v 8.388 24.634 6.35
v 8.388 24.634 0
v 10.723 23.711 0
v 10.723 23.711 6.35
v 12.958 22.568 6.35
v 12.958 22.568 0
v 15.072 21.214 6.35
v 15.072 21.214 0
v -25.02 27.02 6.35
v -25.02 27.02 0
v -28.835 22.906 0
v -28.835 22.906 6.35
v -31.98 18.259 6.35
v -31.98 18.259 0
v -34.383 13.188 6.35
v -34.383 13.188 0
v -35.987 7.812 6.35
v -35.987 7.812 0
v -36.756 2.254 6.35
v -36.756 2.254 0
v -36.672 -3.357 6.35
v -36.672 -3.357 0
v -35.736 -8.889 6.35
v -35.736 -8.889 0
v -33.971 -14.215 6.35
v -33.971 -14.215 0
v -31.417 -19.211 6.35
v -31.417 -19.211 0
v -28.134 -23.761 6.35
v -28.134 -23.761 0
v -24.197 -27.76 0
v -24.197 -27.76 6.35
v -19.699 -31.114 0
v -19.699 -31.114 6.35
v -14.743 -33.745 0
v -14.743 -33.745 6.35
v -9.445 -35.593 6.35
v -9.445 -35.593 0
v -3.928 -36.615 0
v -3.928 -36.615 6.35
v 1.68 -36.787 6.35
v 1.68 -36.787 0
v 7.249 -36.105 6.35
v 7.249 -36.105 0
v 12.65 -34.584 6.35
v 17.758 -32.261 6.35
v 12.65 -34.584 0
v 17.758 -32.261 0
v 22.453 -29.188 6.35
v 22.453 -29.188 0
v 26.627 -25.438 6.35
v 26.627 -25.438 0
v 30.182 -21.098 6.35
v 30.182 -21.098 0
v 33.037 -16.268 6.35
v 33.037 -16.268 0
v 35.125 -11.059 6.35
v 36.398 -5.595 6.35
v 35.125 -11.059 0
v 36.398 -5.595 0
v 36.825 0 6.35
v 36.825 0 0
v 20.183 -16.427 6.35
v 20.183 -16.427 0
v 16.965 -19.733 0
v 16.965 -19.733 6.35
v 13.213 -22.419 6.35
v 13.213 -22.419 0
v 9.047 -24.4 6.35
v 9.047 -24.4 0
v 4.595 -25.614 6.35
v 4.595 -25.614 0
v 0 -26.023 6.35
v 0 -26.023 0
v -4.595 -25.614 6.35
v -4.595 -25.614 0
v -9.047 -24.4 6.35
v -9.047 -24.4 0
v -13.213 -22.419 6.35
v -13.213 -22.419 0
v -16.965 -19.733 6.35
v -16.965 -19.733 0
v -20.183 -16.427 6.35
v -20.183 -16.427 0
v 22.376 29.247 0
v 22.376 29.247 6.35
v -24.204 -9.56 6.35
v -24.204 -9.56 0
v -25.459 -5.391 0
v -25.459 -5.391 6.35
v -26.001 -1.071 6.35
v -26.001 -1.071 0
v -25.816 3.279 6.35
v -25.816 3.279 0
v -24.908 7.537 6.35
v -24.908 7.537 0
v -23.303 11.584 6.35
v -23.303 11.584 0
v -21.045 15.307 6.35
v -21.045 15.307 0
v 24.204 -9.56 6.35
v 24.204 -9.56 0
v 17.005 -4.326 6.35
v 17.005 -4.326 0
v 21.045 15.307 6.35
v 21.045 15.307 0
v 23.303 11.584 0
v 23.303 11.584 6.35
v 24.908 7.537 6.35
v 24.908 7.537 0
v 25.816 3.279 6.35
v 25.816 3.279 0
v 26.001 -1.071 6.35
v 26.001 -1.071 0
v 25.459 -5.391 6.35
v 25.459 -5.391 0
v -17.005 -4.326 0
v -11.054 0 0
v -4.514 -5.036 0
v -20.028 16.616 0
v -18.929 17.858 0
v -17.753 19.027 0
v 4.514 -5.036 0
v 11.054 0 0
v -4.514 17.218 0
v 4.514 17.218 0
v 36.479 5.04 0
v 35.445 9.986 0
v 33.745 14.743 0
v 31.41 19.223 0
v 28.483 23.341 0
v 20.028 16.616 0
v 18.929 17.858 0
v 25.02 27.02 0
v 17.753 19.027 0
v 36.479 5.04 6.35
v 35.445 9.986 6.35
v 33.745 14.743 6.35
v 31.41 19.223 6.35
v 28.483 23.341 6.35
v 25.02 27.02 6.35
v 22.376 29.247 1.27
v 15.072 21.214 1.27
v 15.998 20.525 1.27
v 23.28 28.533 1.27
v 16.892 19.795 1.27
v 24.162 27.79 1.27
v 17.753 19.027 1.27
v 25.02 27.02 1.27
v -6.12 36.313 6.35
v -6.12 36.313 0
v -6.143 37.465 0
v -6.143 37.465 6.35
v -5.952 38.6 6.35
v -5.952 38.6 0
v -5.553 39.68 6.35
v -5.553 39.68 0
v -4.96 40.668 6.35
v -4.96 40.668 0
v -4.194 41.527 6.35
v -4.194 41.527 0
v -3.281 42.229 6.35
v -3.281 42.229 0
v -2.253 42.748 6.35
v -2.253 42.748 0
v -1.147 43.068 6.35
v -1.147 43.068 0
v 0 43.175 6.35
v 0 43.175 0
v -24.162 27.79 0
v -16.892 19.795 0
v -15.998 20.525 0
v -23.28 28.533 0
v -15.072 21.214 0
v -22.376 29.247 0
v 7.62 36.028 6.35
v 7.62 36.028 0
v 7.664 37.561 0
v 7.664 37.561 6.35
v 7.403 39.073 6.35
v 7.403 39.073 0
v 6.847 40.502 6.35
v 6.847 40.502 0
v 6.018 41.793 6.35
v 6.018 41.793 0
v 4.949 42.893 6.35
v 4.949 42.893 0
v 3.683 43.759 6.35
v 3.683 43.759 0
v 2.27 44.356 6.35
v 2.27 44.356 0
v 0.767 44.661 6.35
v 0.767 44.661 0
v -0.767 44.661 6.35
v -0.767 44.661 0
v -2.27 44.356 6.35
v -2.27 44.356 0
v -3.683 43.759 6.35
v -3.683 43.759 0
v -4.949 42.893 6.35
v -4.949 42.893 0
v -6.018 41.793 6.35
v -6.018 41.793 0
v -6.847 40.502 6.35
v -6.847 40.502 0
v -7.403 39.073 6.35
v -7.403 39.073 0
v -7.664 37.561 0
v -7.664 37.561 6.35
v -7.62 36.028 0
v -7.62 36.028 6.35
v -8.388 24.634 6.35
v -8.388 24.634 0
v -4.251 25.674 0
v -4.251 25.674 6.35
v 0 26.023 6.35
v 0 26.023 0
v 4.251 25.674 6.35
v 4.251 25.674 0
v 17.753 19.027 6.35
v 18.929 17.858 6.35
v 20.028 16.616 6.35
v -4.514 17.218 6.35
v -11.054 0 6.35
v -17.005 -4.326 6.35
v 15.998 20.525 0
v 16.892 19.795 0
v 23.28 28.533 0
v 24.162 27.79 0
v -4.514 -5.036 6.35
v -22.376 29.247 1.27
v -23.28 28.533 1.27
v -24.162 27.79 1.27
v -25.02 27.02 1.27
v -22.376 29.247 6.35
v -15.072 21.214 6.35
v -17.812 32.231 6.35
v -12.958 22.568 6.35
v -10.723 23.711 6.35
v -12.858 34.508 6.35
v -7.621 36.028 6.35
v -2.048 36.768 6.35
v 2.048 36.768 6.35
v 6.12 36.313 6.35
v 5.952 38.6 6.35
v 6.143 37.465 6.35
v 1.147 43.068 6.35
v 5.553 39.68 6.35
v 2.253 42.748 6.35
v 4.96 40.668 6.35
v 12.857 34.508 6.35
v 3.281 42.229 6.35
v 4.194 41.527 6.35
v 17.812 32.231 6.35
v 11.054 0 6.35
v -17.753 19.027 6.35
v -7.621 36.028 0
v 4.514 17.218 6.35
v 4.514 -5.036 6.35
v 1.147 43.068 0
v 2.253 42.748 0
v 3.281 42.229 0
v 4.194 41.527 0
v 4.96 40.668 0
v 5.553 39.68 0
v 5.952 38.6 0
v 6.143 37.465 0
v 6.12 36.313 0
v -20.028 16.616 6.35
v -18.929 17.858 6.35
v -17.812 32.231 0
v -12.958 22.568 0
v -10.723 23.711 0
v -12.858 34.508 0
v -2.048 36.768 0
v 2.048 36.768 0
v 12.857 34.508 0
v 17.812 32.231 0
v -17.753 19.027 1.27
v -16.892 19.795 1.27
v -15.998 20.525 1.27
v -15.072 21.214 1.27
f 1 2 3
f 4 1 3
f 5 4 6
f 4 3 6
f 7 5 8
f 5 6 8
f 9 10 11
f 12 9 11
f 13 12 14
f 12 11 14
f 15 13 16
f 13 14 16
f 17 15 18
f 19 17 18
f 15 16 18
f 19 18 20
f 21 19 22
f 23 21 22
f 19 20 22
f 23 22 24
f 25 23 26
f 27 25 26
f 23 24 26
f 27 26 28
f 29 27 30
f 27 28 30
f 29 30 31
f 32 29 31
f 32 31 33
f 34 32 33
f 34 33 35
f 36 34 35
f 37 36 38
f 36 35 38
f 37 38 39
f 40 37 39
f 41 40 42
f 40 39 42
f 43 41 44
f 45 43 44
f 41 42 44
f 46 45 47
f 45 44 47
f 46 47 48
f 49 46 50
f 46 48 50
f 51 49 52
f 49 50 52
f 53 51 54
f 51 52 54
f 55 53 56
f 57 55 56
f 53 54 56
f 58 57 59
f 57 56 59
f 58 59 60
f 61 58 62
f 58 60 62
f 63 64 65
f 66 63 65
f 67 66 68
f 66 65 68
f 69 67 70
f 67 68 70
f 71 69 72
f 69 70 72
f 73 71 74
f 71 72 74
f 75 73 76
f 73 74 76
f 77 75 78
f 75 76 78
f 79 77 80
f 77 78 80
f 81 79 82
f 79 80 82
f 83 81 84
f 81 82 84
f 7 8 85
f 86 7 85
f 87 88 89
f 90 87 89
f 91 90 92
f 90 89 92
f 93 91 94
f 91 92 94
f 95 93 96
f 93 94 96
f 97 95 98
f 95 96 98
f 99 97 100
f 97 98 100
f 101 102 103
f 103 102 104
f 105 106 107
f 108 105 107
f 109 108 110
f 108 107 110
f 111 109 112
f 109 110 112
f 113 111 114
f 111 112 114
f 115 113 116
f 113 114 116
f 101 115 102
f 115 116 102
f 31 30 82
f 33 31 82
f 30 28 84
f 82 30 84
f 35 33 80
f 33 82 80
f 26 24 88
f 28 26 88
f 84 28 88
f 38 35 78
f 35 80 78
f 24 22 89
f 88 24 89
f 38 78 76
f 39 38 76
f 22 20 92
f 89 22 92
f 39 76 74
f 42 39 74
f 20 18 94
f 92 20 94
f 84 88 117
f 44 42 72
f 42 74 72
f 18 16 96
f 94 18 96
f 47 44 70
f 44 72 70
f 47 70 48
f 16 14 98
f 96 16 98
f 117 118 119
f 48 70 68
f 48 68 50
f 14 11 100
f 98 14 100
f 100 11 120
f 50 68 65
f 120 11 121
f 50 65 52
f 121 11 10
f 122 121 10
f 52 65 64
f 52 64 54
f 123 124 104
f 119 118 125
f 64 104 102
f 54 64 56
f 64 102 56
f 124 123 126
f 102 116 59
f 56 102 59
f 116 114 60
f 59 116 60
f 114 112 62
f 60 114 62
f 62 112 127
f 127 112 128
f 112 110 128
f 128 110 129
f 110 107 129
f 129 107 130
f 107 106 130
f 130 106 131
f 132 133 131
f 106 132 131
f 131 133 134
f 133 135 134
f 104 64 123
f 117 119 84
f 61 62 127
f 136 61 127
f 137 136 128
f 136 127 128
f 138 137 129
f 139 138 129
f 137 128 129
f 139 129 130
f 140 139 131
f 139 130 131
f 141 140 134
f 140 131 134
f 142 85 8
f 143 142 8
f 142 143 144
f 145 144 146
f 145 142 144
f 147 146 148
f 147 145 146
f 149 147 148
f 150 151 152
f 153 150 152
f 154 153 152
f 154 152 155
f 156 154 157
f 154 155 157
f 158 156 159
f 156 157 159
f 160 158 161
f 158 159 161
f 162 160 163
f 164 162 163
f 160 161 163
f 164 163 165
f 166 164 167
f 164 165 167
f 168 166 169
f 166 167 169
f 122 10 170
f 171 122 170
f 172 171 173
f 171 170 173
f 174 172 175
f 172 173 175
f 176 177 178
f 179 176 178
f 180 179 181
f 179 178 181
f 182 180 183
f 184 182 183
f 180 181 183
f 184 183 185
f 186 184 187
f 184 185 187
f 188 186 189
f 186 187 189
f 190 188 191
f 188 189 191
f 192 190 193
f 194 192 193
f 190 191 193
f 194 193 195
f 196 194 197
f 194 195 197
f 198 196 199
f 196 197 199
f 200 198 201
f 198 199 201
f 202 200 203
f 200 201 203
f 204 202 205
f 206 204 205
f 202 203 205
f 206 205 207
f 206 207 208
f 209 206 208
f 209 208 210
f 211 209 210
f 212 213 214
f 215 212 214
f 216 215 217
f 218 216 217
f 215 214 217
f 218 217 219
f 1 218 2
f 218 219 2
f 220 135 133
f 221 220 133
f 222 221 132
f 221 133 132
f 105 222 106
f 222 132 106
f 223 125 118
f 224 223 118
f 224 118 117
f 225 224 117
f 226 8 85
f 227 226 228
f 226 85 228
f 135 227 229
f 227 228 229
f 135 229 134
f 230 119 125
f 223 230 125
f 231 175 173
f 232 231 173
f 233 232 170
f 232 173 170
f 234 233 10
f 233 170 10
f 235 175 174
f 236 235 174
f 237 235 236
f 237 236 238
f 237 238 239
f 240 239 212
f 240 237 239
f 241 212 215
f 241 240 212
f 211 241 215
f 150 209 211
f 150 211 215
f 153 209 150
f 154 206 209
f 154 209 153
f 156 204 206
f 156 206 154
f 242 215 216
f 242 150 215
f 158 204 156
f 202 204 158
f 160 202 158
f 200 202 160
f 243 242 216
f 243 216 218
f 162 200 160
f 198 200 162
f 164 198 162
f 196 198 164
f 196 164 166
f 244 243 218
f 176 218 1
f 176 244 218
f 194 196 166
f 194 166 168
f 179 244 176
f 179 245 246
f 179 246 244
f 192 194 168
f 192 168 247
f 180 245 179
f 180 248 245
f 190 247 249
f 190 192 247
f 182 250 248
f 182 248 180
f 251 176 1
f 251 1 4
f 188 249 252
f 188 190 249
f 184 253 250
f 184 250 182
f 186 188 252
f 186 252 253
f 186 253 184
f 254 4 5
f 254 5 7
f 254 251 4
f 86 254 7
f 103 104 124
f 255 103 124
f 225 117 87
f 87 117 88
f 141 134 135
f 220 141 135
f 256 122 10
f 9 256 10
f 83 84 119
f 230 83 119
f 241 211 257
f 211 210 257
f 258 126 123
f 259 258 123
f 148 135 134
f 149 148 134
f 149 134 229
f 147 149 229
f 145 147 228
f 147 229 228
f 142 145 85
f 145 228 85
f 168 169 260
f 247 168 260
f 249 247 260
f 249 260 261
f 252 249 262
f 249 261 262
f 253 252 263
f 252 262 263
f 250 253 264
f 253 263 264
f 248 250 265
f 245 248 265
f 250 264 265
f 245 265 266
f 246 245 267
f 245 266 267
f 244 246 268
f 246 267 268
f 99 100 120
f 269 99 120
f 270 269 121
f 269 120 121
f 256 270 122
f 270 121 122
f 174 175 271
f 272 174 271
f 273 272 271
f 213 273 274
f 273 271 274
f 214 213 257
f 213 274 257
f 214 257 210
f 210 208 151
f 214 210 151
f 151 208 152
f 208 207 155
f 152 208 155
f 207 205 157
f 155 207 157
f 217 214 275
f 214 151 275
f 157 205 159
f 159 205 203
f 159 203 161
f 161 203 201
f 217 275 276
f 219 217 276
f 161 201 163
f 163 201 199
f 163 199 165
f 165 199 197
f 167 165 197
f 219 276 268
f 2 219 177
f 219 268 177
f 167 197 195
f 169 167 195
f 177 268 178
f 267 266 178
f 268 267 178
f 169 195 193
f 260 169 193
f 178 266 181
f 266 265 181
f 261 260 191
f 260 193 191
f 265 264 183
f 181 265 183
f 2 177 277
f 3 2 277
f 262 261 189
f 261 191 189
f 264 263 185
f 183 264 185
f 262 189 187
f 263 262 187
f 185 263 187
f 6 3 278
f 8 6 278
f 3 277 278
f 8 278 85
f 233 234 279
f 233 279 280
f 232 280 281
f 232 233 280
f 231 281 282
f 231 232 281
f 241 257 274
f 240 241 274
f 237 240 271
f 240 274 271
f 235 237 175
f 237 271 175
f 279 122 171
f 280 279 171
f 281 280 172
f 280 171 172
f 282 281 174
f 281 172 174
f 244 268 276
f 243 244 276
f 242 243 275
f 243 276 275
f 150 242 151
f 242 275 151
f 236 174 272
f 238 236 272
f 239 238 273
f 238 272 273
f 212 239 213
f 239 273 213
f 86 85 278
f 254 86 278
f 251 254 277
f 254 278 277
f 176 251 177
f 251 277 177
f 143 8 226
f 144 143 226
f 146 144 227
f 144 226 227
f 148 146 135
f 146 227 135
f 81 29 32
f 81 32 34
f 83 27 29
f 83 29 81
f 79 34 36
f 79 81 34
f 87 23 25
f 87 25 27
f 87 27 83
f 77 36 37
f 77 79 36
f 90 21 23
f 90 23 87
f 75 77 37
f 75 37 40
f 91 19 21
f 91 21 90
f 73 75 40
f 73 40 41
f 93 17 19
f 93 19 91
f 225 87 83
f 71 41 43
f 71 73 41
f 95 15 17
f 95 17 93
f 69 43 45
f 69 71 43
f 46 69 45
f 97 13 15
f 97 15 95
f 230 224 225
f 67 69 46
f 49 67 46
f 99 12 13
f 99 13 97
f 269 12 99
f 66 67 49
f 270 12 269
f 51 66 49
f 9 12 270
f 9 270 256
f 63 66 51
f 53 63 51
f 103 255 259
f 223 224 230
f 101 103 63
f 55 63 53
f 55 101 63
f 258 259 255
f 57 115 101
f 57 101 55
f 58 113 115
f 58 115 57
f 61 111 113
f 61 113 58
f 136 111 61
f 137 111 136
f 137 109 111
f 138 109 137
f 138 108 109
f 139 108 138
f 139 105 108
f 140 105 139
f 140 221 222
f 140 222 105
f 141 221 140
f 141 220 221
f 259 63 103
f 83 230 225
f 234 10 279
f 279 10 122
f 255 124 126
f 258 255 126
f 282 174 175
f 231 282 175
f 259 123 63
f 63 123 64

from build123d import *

# Parameters (mm, degrees)
F1_DEPTH = 6.35
F2_DEPTH = 6.35
F3_DEPTH = 1.27
F4_DEPTH = 1.27
F5_DEPTH = 6.35
F6_DEPTH = 6.35


with BuildPart() as f1:
    # F0 (on Top) → F1 (new body)
    with BuildSketch(Plane.XY):
        with BuildLine():
            Line((15.0724098278, 21.2138513725), (22.375966573, 29.2474573979))
            ThreePointArc((22.375966573, 29.2474573979), (15.3764175488, 33.4613721728), (7.62, 36.0282284372))
            ThreePointArc((7.62, 36.0282284372), (6.8712399575, 36.1784978374), (6.1195247725, 36.3132078021))
            ThreePointArc((6.1195247725, 36.3132078021), (0, 36.8252310831), (-6.1195247725, 36.3132078021))
            ThreePointArc((-6.1195247725, 36.3132078021), (-6.8712399575, 36.1784978374), (-7.62, 36.0282284372))
            ThreePointArc((-7.62, 36.0282284372), (-7.6206373591, 36.0280936293), (-7.6212747158, 36.0279588102))
            ThreePointArc((-7.6212747158, 36.0279588102), (-15.3770094975, 33.4611001498), (-22.375966573, 29.2474573979))
            Line((-22.375966573, 29.2474573979), (-15.0724098278, 21.2138513725))
            ThreePointArc((-15.0724098278, 21.2138513725), (-11.8541639172, 23.1664374882), (-8.3878839091, 24.6342938116))
            ThreePointArc((-8.3878839091, 24.6342938116), (0, 26.0231632987), (8.3878839091, 24.6342938116))
            ThreePointArc((8.3878839091, 24.6342938116), (11.8541639172, 23.1664374882), (15.0724098278, 21.2138513725))
        make_face()
    extrude(amount=F1_DEPTH)

    # F0 (on Top) → F5 (cut)
    with BuildSketch(Plane.XY):
        with BuildLine():
            ThreePointArc((-6.1195247725, 36.3132078021), (0, 36.8252310831), (6.1195247725, 36.3132078021))
            ThreePointArc((6.1195247725, 36.3132078021), (4.5971716019, 41.1152747998), (0, 43.1752310831))
            ThreePointArc((0, 43.1752310831), (-4.5971716019, 41.1152747998), (-6.1195247725, 36.3132078021))
        make_face()
    extrude(amount=-F5_DEPTH, mode=Mode.SUBTRACT)

    # F0 (on Top) → F6 (join)
    with BuildSketch(Plane.XY):
        with BuildLine():
            ThreePointArc((6.1195247725, 36.3132078021), (6.8712399575, 36.1784978374), (7.62, 36.0282284372))
            ThreePointArc((7.62, 36.0282284372), (0, 44.6992310831), (-7.62, 36.0282284372))
            ThreePointArc((-7.62, 36.0282284372), (-6.8712399575, 36.1784978374), (-6.1195247725, 36.3132078021))
            ThreePointArc((-6.1195247725, 36.3132078021), (-4.5971716019, 41.1152747998), (0, 43.1752310831))
            ThreePointArc((0, 43.1752310831), (4.5971716019, 41.1152747998), (6.1195247725, 36.3132078021))
        make_face()
    extrude(amount=F6_DEPTH)


with BuildPart() as f2:
    # F0 (on Top) → F2 (new body)
    with BuildSketch(Plane.XY):
        with BuildLine():
            ThreePointArc((-25.0199841303, 27.0203263941), (-14.7433196233, -33.7451058793), (36.8252310831, 0))
            ThreePointArc((36.8252310831, 0), (33.7451058793, 14.7433196233), (25.0199841303, 27.0203263941))
            Line((25.0199841303, 27.0203263941), (17.7531453108, 19.0271085466))
            ThreePointArc((17.7531453108, 19.0271085466), (19.4881594674, 17.2457724861), (21.0452308897, 15.3069685069))
            ThreePointArc((21.0452308897, 15.3069685069), (25.8157518244, 3.2790220816), (24.2036932435, -9.5596161767))
            Line((24.2036932435, -9.5596161767), (17.005158821, -4.326326612))
            Line((17.005158821, -4.326326612), (11.0541770047, 0))
            Line((11.0541770047, 0), (4.5139469962, 17.2177678458))
            Line((4.5139469962, 17.2177678458), (4.5139469962, -5.0363289596))
            Line((4.5139469962, -5.0363289596), (20.1827575969, -16.4274564025))
            ThreePointArc((20.1827575969, -16.4274564025), (0, -26.0231632987), (-20.1827575969, -16.4274564025))
            Line((-20.1827575969, -16.4274564025), (-4.5139469962, -5.0363289596))
            Line((-4.5139469962, -5.0363289596), (-4.5139469962, 0))
            Line((-4.5139469962, 0), (-4.5139469962, 17.2177678458))
            Line((-4.5139469962, 17.2177678458), (-11.0541770047, 0))
            Line((-11.0541770047, 0), (-17.005158821, -4.326326612))
            Line((-17.005158821, -4.326326612), (-24.2036932435, -9.5596161767))
            ThreePointArc((-24.2036932435, -9.5596161767), (-25.8157518244, 3.2790220816), (-21.0452308897, 15.3069685069))
            ThreePointArc((-21.0452308897, 15.3069685069), (-19.4881594674, 17.2457724861), (-17.7531453108, 19.0271085466))
            Line((-17.7531453108, 19.0271085466), (-25.0199841303, 27.0203263941))
        make_face()
    extrude(amount=F2_DEPTH)


with BuildPart() as f3:
    # F0 (on Top) → F3 (new body)
    with BuildSketch(Plane.XY):
        with BuildLine():
            ThreePointArc((-22.375966573, 29.2474573979), (-23.7241240912, 28.1649352995), (-25.0199841303, 27.0203263941))
            Line((-25.0199841303, 27.0203263941), (-17.7531453108, 19.0271085466))
            ThreePointArc((-17.7531453108, 19.0271085466), (-16.4491558624, 20.1650762331), (-15.0724098278, 21.2138513725))
            Line((-15.0724098278, 21.2138513725), (-22.375966573, 29.2474573979))
        make_face()
    extrude(amount=F3_DEPTH)


with BuildPart() as f4:
    # F0 (on Top) → F4 (new body)
    with BuildSketch(Plane.XY):
        with BuildLine():
            Line((17.7531453108, 19.0271085466), (25.0199841303, 27.0203263941))
            ThreePointArc((25.0199841303, 27.0203263941), (23.7241240912, 28.1649352995), (22.375966573, 29.2474573979))
            Line((22.375966573, 29.2474573979), (15.0724098278, 21.2138513725))
            ThreePointArc((15.0724098278, 21.2138513725), (16.4491558624, 20.1650762331), (17.7531453108, 19.0271085466))
        make_face()
    extrude(amount=F4_DEPTH)


solid = Compound([f1.part, f2.part, f3.part, f4.part])
